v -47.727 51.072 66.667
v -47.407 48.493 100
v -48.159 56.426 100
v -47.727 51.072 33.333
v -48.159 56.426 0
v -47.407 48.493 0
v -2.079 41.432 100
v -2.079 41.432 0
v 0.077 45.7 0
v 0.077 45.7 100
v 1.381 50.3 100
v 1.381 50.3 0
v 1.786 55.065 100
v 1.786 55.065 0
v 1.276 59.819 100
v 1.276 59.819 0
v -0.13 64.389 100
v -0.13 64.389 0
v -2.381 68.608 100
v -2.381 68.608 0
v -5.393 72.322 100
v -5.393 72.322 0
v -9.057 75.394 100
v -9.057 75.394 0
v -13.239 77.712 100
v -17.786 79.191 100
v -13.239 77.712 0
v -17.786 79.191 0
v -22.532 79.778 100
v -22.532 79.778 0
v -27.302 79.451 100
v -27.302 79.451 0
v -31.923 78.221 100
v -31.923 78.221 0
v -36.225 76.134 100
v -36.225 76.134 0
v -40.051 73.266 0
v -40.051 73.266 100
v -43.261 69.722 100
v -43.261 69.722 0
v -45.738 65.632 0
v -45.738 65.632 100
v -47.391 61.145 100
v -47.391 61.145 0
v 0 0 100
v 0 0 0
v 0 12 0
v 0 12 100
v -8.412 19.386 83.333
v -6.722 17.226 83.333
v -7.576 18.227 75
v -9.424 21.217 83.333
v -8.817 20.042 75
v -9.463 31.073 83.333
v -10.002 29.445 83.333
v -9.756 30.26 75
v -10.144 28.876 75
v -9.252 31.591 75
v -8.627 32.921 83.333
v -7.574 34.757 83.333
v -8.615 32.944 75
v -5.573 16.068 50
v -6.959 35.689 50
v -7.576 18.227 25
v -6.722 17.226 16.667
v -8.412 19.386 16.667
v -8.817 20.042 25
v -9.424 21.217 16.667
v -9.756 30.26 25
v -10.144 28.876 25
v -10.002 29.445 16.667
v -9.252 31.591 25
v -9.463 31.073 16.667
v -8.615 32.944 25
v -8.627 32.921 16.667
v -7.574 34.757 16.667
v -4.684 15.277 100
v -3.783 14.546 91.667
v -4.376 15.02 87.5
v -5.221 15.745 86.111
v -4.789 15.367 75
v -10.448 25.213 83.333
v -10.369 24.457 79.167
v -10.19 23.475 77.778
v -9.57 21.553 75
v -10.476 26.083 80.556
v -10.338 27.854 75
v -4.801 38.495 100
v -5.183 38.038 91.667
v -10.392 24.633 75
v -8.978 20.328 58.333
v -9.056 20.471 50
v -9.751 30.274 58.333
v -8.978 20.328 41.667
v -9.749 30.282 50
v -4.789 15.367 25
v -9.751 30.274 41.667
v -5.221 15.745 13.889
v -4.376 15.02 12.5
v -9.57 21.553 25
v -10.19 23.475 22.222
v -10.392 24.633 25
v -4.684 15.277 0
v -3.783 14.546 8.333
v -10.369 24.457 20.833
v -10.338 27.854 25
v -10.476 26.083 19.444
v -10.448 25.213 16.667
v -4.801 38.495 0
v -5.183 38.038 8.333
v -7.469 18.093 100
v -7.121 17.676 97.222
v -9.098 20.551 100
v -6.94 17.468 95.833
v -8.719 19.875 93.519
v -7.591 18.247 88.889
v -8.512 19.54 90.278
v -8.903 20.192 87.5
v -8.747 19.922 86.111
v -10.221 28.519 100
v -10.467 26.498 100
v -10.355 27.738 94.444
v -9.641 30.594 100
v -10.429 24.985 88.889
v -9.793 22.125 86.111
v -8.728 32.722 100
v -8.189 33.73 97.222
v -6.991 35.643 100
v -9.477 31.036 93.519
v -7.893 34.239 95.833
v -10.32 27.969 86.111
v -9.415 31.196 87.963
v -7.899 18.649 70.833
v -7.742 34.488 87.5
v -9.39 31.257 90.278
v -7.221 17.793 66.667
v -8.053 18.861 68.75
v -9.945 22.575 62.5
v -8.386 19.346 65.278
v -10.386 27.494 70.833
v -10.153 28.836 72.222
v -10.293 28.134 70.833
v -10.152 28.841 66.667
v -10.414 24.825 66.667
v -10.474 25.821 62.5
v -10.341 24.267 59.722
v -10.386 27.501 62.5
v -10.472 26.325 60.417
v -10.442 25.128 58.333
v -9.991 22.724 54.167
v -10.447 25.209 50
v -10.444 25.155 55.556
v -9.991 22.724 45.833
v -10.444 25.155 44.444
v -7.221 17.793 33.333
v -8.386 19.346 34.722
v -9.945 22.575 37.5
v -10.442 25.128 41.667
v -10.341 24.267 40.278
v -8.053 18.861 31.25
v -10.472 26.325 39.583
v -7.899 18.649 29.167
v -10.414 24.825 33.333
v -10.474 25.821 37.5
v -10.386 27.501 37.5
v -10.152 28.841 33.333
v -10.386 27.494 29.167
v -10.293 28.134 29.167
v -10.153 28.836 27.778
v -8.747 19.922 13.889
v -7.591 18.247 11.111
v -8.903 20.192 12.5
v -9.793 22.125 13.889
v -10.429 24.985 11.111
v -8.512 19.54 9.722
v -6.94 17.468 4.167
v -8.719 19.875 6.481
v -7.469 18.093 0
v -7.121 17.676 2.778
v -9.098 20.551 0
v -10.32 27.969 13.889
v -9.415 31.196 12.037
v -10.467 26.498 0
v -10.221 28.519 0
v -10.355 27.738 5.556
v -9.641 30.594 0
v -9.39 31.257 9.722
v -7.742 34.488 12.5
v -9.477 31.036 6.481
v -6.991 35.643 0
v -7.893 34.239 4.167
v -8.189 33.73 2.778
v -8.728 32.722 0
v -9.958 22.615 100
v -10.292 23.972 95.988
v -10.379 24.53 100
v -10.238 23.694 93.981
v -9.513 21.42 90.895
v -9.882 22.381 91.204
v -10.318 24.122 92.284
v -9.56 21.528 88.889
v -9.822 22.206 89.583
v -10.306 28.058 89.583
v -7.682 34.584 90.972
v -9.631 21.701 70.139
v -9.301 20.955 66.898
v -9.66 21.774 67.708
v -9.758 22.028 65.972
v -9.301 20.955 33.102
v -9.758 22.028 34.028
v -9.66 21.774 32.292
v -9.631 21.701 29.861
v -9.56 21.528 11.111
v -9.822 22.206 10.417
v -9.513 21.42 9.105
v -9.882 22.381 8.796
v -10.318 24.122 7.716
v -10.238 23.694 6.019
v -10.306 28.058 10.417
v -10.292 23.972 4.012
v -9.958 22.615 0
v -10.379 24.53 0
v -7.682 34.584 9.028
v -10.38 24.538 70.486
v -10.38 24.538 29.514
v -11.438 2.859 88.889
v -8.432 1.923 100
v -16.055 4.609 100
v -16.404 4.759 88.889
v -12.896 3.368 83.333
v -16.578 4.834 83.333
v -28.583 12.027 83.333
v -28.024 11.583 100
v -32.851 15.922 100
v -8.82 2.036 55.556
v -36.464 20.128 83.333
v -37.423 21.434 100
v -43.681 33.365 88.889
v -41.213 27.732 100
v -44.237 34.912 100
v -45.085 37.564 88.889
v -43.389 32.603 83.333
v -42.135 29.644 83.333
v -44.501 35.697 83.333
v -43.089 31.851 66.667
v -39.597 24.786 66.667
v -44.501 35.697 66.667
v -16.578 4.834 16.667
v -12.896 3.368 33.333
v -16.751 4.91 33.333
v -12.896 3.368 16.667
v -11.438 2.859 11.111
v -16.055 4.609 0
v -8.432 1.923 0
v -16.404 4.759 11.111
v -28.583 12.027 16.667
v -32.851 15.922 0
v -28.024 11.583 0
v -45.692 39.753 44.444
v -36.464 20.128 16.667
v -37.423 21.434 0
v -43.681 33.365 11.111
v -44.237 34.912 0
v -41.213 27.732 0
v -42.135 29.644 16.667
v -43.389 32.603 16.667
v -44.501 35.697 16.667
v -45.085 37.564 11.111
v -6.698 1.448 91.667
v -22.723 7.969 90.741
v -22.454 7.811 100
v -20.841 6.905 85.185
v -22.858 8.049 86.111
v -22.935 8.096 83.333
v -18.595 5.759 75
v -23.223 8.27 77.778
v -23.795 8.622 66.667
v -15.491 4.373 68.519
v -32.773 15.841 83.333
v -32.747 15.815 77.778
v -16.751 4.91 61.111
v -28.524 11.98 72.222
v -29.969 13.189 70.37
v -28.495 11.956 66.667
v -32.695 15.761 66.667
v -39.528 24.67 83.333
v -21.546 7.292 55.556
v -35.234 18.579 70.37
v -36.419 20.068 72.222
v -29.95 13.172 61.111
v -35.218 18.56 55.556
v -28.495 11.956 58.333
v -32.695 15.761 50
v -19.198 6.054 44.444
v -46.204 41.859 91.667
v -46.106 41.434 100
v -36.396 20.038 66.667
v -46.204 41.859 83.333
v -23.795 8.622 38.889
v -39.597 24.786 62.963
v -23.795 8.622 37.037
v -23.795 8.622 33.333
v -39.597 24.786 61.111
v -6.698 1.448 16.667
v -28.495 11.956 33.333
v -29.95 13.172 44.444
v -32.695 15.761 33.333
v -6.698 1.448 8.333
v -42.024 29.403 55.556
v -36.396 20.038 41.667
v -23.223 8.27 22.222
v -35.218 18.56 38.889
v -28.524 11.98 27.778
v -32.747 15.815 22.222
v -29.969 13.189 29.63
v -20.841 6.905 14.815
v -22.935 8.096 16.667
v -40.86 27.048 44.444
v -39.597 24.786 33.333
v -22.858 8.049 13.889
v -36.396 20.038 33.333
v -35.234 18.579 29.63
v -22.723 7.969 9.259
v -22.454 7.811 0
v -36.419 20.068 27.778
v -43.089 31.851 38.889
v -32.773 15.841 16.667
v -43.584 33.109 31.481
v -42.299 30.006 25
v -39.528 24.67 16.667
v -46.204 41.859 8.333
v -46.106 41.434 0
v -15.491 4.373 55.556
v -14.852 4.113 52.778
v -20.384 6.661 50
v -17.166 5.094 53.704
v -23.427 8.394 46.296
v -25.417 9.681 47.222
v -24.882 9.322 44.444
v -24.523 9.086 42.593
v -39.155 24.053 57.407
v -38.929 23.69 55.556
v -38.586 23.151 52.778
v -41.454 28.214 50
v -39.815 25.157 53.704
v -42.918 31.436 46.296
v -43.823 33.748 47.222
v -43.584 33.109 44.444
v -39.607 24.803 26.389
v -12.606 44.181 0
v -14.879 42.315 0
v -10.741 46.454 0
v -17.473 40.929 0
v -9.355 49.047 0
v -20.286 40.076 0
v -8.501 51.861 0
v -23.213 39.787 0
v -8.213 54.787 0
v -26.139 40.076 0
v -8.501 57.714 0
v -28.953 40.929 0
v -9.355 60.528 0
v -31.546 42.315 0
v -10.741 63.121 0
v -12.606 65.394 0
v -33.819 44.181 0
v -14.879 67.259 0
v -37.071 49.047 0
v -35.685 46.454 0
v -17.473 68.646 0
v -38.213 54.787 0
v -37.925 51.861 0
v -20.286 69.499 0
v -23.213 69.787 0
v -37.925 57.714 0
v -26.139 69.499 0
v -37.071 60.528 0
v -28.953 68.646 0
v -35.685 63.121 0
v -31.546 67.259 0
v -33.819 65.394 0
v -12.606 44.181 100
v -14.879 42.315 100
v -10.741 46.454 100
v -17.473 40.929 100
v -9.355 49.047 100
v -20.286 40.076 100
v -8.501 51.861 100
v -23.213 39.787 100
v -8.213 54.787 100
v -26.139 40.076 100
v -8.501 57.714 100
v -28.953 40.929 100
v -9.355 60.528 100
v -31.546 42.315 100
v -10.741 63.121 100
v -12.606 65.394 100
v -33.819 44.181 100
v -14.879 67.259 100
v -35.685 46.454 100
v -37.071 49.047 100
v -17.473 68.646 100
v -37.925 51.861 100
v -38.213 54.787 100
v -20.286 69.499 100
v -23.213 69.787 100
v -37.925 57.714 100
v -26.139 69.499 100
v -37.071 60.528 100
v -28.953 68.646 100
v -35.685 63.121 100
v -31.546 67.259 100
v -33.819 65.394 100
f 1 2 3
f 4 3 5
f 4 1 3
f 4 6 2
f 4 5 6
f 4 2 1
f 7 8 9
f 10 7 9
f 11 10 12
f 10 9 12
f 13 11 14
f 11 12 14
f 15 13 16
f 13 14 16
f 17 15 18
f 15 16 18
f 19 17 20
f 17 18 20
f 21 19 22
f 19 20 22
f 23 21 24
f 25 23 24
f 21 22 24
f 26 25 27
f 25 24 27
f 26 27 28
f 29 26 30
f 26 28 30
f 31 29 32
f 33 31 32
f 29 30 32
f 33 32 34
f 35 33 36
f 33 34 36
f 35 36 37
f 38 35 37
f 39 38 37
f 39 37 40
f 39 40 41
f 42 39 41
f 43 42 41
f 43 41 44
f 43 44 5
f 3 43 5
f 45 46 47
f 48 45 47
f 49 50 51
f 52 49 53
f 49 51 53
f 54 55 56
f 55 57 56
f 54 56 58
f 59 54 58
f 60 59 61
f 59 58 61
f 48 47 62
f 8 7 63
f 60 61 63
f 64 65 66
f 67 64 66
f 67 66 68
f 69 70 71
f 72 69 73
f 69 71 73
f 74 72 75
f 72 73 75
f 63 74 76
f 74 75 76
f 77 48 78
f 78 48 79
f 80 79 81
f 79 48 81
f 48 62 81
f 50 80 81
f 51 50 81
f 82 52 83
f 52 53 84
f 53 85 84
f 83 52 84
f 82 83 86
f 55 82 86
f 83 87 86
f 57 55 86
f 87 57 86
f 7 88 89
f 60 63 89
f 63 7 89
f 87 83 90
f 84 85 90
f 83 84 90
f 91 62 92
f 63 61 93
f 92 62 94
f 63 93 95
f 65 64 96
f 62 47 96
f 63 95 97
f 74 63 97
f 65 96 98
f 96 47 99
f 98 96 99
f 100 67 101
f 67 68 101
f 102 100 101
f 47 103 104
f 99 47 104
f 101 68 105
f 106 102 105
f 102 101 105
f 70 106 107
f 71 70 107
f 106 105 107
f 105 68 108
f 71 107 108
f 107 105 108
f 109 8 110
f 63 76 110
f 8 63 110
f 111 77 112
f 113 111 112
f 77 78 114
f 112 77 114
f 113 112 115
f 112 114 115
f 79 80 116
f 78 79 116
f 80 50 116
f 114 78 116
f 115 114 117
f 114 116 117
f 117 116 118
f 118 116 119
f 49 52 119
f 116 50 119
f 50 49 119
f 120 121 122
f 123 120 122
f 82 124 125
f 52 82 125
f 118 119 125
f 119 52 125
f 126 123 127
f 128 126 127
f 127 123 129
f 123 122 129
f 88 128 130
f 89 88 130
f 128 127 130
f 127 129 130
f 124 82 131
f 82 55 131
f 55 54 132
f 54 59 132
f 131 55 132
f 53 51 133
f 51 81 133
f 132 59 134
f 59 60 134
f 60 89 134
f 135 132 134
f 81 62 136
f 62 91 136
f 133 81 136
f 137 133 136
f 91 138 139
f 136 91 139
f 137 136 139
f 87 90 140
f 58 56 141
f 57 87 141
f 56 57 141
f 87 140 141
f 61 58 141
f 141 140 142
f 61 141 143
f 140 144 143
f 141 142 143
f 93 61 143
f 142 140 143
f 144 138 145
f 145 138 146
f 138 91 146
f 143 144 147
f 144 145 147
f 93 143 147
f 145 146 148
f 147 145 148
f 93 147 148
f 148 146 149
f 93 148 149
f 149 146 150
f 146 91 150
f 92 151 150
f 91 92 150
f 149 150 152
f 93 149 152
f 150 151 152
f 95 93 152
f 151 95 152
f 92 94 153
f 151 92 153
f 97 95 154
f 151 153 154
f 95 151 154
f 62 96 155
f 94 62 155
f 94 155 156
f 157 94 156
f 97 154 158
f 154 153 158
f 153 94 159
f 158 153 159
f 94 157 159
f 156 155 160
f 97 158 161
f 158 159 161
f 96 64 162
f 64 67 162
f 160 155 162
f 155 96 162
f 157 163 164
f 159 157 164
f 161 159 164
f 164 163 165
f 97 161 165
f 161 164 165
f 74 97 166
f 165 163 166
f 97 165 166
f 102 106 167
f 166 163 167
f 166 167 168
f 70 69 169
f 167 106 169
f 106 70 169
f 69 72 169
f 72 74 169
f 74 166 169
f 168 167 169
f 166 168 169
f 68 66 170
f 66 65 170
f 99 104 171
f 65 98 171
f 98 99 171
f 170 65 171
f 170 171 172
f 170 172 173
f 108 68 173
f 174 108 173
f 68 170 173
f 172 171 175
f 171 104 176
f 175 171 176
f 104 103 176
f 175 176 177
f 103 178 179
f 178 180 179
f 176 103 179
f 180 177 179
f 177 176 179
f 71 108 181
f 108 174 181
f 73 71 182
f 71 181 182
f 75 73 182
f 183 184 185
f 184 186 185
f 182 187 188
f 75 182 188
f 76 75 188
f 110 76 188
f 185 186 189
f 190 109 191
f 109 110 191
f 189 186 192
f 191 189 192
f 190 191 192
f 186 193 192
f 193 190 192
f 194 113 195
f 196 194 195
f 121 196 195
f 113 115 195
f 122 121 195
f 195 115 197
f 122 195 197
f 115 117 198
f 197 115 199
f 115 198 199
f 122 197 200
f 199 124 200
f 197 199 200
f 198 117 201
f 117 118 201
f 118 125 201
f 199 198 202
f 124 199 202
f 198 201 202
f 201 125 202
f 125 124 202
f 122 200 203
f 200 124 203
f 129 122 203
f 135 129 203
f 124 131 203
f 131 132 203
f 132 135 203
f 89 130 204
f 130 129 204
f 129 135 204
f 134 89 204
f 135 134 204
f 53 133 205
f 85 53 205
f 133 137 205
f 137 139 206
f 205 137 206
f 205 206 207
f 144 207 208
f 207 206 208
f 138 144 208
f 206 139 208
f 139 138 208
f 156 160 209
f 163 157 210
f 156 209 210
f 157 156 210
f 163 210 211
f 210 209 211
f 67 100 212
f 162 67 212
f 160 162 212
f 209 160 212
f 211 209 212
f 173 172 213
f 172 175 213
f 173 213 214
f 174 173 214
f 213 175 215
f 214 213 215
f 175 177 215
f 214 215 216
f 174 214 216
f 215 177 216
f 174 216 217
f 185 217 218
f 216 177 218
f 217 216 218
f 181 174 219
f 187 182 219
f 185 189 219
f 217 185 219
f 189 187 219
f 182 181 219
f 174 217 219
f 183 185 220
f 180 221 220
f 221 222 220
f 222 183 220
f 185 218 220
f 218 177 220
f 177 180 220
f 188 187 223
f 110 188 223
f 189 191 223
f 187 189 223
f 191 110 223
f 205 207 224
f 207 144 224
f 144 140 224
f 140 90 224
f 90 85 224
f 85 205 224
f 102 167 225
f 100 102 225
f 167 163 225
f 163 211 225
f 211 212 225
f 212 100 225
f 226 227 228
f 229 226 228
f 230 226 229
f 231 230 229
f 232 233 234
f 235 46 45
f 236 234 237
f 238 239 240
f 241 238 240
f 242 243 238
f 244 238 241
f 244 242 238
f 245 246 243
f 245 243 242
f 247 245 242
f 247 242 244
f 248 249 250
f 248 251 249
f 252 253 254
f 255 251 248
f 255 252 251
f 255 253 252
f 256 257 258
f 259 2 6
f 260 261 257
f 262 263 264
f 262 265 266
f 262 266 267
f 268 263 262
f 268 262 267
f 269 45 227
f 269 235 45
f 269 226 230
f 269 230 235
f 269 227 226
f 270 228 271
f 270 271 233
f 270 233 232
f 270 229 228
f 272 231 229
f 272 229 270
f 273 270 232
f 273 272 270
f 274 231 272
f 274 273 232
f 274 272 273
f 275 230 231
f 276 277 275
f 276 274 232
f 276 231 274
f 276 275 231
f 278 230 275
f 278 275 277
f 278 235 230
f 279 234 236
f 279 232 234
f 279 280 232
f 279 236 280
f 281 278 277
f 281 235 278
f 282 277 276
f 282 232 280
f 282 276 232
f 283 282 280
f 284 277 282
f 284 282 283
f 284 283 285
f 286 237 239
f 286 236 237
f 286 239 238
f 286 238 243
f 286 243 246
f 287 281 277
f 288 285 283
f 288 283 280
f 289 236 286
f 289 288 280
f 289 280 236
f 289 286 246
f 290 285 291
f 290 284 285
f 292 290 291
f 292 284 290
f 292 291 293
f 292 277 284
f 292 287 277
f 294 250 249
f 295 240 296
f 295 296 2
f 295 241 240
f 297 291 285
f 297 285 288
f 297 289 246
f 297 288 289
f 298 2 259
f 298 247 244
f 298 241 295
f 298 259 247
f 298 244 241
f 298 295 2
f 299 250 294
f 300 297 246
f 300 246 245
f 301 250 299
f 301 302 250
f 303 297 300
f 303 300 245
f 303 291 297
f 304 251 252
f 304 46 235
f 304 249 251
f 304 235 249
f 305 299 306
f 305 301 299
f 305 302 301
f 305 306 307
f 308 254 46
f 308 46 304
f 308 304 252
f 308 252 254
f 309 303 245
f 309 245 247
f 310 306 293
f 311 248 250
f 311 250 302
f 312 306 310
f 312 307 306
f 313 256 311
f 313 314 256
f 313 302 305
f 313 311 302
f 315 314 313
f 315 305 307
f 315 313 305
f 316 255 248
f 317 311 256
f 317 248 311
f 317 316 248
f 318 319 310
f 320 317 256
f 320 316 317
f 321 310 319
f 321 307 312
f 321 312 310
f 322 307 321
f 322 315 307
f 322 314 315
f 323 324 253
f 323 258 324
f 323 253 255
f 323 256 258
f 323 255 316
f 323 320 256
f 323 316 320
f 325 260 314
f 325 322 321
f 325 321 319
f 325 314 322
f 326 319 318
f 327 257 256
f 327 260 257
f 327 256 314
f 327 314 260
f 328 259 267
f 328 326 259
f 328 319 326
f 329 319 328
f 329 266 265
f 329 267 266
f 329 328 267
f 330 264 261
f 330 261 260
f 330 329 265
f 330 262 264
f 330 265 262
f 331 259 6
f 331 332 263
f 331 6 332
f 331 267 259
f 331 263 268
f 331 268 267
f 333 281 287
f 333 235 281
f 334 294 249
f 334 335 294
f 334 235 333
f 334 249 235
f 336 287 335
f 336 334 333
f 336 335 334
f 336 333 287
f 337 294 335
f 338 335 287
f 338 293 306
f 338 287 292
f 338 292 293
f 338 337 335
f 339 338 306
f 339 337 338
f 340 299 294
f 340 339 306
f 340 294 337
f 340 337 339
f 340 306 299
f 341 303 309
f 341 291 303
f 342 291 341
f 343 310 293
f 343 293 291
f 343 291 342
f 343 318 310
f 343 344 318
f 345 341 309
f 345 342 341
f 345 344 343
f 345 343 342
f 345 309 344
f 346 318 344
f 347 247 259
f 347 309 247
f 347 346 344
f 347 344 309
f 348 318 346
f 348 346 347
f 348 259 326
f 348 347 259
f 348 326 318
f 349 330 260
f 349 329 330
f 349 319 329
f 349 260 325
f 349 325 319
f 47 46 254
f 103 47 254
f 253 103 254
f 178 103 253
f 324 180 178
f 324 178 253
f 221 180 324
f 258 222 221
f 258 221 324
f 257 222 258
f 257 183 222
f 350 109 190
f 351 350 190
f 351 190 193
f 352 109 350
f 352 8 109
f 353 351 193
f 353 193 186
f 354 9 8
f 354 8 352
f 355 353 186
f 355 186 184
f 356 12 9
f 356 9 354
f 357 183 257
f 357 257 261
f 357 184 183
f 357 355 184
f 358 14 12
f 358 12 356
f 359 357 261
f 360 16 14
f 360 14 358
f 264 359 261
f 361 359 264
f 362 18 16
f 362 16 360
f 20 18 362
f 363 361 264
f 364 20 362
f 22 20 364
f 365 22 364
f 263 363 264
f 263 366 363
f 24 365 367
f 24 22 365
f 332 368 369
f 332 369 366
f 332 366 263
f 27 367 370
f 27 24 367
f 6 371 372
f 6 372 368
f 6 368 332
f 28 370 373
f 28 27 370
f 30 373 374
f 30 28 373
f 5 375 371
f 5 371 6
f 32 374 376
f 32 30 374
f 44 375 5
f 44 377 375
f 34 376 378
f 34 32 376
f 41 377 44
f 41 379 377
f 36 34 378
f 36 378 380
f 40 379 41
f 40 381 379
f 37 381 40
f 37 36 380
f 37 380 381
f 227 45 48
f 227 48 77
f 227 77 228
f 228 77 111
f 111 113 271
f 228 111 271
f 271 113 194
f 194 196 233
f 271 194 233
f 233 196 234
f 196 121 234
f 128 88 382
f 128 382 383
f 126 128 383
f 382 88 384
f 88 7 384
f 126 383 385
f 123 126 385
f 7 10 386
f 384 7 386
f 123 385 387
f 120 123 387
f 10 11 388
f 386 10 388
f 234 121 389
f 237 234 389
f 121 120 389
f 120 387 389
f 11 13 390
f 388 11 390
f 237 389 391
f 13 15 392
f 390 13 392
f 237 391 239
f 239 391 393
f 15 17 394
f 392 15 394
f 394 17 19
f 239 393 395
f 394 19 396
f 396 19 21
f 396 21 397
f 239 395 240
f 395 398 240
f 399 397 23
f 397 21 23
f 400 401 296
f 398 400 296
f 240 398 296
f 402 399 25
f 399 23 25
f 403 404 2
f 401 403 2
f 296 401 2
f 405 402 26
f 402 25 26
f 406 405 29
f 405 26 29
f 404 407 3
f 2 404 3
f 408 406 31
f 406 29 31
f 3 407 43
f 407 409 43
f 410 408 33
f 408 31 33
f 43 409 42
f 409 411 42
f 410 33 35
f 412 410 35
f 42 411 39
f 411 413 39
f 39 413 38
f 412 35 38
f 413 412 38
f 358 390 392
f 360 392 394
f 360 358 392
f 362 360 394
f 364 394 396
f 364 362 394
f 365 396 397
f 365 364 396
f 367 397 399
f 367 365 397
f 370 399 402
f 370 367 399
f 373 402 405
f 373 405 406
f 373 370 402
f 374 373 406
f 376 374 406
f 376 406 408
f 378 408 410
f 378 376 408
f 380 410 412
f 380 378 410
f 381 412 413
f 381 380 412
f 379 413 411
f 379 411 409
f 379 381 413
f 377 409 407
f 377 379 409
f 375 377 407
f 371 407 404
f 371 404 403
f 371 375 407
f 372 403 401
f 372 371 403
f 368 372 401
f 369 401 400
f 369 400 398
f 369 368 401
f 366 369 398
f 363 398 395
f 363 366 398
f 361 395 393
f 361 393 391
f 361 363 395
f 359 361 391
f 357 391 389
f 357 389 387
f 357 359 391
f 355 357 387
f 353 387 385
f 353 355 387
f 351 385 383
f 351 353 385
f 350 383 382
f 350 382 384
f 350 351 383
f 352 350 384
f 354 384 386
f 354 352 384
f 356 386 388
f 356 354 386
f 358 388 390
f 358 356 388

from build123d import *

# Parameters (mm, degrees)
SKETCH2_R           = 15
BOSS_EXTRUDE3_DEPTH = 100


with BuildPart() as part:
    # Sketch2 → Boss-Extrude3 (new body)
    with BuildSketch(Plane.XY):
        with BuildLine():
            add(Edge.make_bspline(
                [(0, 0), (-27.790971102, 4.850972812), (-43.593467312, 21.015270296), (-47.40748863, 48.492892452)],
                knots=[0, 0, 0, 0, 0.824388571, 0.824388571, 0.824388571, 0.824388571], degree=3))
            Line((0, 0), (0, 12))
            add(Edge.make_bspline(
                [(0, 12), (-19.855506459, 23.701138321), (-2.078921696, 41.432276663)],
                knots=[0, 0, 0, 1, 1, 1], degree=2))
            ThreePointArc((-2.078921696, 41.432276663), (-15.477506866, 78.560495393), (-48.159097141, 56.425898768))
            add(Edge.make_bspline(
                [(-47.40748863, 48.492892452), (-47.761040822, 51.040013382), (-48.011576992, 53.684348821), (-48.159097141, 56.425898768)],
                knots=[0.824388571, 0.824388571, 0.824388571, 0.824388571, 0.900807752, 0.900807752, 0.900807752, 0.900807752], degree=3))
        make_face()
        with Locations((-23.212854475, 54.787308872)):
            Circle(SKETCH2_R, mode=Mode.SUBTRACT)
    extrude(amount=BOSS_EXTRUDE3_DEPTH)


solid = part.part
